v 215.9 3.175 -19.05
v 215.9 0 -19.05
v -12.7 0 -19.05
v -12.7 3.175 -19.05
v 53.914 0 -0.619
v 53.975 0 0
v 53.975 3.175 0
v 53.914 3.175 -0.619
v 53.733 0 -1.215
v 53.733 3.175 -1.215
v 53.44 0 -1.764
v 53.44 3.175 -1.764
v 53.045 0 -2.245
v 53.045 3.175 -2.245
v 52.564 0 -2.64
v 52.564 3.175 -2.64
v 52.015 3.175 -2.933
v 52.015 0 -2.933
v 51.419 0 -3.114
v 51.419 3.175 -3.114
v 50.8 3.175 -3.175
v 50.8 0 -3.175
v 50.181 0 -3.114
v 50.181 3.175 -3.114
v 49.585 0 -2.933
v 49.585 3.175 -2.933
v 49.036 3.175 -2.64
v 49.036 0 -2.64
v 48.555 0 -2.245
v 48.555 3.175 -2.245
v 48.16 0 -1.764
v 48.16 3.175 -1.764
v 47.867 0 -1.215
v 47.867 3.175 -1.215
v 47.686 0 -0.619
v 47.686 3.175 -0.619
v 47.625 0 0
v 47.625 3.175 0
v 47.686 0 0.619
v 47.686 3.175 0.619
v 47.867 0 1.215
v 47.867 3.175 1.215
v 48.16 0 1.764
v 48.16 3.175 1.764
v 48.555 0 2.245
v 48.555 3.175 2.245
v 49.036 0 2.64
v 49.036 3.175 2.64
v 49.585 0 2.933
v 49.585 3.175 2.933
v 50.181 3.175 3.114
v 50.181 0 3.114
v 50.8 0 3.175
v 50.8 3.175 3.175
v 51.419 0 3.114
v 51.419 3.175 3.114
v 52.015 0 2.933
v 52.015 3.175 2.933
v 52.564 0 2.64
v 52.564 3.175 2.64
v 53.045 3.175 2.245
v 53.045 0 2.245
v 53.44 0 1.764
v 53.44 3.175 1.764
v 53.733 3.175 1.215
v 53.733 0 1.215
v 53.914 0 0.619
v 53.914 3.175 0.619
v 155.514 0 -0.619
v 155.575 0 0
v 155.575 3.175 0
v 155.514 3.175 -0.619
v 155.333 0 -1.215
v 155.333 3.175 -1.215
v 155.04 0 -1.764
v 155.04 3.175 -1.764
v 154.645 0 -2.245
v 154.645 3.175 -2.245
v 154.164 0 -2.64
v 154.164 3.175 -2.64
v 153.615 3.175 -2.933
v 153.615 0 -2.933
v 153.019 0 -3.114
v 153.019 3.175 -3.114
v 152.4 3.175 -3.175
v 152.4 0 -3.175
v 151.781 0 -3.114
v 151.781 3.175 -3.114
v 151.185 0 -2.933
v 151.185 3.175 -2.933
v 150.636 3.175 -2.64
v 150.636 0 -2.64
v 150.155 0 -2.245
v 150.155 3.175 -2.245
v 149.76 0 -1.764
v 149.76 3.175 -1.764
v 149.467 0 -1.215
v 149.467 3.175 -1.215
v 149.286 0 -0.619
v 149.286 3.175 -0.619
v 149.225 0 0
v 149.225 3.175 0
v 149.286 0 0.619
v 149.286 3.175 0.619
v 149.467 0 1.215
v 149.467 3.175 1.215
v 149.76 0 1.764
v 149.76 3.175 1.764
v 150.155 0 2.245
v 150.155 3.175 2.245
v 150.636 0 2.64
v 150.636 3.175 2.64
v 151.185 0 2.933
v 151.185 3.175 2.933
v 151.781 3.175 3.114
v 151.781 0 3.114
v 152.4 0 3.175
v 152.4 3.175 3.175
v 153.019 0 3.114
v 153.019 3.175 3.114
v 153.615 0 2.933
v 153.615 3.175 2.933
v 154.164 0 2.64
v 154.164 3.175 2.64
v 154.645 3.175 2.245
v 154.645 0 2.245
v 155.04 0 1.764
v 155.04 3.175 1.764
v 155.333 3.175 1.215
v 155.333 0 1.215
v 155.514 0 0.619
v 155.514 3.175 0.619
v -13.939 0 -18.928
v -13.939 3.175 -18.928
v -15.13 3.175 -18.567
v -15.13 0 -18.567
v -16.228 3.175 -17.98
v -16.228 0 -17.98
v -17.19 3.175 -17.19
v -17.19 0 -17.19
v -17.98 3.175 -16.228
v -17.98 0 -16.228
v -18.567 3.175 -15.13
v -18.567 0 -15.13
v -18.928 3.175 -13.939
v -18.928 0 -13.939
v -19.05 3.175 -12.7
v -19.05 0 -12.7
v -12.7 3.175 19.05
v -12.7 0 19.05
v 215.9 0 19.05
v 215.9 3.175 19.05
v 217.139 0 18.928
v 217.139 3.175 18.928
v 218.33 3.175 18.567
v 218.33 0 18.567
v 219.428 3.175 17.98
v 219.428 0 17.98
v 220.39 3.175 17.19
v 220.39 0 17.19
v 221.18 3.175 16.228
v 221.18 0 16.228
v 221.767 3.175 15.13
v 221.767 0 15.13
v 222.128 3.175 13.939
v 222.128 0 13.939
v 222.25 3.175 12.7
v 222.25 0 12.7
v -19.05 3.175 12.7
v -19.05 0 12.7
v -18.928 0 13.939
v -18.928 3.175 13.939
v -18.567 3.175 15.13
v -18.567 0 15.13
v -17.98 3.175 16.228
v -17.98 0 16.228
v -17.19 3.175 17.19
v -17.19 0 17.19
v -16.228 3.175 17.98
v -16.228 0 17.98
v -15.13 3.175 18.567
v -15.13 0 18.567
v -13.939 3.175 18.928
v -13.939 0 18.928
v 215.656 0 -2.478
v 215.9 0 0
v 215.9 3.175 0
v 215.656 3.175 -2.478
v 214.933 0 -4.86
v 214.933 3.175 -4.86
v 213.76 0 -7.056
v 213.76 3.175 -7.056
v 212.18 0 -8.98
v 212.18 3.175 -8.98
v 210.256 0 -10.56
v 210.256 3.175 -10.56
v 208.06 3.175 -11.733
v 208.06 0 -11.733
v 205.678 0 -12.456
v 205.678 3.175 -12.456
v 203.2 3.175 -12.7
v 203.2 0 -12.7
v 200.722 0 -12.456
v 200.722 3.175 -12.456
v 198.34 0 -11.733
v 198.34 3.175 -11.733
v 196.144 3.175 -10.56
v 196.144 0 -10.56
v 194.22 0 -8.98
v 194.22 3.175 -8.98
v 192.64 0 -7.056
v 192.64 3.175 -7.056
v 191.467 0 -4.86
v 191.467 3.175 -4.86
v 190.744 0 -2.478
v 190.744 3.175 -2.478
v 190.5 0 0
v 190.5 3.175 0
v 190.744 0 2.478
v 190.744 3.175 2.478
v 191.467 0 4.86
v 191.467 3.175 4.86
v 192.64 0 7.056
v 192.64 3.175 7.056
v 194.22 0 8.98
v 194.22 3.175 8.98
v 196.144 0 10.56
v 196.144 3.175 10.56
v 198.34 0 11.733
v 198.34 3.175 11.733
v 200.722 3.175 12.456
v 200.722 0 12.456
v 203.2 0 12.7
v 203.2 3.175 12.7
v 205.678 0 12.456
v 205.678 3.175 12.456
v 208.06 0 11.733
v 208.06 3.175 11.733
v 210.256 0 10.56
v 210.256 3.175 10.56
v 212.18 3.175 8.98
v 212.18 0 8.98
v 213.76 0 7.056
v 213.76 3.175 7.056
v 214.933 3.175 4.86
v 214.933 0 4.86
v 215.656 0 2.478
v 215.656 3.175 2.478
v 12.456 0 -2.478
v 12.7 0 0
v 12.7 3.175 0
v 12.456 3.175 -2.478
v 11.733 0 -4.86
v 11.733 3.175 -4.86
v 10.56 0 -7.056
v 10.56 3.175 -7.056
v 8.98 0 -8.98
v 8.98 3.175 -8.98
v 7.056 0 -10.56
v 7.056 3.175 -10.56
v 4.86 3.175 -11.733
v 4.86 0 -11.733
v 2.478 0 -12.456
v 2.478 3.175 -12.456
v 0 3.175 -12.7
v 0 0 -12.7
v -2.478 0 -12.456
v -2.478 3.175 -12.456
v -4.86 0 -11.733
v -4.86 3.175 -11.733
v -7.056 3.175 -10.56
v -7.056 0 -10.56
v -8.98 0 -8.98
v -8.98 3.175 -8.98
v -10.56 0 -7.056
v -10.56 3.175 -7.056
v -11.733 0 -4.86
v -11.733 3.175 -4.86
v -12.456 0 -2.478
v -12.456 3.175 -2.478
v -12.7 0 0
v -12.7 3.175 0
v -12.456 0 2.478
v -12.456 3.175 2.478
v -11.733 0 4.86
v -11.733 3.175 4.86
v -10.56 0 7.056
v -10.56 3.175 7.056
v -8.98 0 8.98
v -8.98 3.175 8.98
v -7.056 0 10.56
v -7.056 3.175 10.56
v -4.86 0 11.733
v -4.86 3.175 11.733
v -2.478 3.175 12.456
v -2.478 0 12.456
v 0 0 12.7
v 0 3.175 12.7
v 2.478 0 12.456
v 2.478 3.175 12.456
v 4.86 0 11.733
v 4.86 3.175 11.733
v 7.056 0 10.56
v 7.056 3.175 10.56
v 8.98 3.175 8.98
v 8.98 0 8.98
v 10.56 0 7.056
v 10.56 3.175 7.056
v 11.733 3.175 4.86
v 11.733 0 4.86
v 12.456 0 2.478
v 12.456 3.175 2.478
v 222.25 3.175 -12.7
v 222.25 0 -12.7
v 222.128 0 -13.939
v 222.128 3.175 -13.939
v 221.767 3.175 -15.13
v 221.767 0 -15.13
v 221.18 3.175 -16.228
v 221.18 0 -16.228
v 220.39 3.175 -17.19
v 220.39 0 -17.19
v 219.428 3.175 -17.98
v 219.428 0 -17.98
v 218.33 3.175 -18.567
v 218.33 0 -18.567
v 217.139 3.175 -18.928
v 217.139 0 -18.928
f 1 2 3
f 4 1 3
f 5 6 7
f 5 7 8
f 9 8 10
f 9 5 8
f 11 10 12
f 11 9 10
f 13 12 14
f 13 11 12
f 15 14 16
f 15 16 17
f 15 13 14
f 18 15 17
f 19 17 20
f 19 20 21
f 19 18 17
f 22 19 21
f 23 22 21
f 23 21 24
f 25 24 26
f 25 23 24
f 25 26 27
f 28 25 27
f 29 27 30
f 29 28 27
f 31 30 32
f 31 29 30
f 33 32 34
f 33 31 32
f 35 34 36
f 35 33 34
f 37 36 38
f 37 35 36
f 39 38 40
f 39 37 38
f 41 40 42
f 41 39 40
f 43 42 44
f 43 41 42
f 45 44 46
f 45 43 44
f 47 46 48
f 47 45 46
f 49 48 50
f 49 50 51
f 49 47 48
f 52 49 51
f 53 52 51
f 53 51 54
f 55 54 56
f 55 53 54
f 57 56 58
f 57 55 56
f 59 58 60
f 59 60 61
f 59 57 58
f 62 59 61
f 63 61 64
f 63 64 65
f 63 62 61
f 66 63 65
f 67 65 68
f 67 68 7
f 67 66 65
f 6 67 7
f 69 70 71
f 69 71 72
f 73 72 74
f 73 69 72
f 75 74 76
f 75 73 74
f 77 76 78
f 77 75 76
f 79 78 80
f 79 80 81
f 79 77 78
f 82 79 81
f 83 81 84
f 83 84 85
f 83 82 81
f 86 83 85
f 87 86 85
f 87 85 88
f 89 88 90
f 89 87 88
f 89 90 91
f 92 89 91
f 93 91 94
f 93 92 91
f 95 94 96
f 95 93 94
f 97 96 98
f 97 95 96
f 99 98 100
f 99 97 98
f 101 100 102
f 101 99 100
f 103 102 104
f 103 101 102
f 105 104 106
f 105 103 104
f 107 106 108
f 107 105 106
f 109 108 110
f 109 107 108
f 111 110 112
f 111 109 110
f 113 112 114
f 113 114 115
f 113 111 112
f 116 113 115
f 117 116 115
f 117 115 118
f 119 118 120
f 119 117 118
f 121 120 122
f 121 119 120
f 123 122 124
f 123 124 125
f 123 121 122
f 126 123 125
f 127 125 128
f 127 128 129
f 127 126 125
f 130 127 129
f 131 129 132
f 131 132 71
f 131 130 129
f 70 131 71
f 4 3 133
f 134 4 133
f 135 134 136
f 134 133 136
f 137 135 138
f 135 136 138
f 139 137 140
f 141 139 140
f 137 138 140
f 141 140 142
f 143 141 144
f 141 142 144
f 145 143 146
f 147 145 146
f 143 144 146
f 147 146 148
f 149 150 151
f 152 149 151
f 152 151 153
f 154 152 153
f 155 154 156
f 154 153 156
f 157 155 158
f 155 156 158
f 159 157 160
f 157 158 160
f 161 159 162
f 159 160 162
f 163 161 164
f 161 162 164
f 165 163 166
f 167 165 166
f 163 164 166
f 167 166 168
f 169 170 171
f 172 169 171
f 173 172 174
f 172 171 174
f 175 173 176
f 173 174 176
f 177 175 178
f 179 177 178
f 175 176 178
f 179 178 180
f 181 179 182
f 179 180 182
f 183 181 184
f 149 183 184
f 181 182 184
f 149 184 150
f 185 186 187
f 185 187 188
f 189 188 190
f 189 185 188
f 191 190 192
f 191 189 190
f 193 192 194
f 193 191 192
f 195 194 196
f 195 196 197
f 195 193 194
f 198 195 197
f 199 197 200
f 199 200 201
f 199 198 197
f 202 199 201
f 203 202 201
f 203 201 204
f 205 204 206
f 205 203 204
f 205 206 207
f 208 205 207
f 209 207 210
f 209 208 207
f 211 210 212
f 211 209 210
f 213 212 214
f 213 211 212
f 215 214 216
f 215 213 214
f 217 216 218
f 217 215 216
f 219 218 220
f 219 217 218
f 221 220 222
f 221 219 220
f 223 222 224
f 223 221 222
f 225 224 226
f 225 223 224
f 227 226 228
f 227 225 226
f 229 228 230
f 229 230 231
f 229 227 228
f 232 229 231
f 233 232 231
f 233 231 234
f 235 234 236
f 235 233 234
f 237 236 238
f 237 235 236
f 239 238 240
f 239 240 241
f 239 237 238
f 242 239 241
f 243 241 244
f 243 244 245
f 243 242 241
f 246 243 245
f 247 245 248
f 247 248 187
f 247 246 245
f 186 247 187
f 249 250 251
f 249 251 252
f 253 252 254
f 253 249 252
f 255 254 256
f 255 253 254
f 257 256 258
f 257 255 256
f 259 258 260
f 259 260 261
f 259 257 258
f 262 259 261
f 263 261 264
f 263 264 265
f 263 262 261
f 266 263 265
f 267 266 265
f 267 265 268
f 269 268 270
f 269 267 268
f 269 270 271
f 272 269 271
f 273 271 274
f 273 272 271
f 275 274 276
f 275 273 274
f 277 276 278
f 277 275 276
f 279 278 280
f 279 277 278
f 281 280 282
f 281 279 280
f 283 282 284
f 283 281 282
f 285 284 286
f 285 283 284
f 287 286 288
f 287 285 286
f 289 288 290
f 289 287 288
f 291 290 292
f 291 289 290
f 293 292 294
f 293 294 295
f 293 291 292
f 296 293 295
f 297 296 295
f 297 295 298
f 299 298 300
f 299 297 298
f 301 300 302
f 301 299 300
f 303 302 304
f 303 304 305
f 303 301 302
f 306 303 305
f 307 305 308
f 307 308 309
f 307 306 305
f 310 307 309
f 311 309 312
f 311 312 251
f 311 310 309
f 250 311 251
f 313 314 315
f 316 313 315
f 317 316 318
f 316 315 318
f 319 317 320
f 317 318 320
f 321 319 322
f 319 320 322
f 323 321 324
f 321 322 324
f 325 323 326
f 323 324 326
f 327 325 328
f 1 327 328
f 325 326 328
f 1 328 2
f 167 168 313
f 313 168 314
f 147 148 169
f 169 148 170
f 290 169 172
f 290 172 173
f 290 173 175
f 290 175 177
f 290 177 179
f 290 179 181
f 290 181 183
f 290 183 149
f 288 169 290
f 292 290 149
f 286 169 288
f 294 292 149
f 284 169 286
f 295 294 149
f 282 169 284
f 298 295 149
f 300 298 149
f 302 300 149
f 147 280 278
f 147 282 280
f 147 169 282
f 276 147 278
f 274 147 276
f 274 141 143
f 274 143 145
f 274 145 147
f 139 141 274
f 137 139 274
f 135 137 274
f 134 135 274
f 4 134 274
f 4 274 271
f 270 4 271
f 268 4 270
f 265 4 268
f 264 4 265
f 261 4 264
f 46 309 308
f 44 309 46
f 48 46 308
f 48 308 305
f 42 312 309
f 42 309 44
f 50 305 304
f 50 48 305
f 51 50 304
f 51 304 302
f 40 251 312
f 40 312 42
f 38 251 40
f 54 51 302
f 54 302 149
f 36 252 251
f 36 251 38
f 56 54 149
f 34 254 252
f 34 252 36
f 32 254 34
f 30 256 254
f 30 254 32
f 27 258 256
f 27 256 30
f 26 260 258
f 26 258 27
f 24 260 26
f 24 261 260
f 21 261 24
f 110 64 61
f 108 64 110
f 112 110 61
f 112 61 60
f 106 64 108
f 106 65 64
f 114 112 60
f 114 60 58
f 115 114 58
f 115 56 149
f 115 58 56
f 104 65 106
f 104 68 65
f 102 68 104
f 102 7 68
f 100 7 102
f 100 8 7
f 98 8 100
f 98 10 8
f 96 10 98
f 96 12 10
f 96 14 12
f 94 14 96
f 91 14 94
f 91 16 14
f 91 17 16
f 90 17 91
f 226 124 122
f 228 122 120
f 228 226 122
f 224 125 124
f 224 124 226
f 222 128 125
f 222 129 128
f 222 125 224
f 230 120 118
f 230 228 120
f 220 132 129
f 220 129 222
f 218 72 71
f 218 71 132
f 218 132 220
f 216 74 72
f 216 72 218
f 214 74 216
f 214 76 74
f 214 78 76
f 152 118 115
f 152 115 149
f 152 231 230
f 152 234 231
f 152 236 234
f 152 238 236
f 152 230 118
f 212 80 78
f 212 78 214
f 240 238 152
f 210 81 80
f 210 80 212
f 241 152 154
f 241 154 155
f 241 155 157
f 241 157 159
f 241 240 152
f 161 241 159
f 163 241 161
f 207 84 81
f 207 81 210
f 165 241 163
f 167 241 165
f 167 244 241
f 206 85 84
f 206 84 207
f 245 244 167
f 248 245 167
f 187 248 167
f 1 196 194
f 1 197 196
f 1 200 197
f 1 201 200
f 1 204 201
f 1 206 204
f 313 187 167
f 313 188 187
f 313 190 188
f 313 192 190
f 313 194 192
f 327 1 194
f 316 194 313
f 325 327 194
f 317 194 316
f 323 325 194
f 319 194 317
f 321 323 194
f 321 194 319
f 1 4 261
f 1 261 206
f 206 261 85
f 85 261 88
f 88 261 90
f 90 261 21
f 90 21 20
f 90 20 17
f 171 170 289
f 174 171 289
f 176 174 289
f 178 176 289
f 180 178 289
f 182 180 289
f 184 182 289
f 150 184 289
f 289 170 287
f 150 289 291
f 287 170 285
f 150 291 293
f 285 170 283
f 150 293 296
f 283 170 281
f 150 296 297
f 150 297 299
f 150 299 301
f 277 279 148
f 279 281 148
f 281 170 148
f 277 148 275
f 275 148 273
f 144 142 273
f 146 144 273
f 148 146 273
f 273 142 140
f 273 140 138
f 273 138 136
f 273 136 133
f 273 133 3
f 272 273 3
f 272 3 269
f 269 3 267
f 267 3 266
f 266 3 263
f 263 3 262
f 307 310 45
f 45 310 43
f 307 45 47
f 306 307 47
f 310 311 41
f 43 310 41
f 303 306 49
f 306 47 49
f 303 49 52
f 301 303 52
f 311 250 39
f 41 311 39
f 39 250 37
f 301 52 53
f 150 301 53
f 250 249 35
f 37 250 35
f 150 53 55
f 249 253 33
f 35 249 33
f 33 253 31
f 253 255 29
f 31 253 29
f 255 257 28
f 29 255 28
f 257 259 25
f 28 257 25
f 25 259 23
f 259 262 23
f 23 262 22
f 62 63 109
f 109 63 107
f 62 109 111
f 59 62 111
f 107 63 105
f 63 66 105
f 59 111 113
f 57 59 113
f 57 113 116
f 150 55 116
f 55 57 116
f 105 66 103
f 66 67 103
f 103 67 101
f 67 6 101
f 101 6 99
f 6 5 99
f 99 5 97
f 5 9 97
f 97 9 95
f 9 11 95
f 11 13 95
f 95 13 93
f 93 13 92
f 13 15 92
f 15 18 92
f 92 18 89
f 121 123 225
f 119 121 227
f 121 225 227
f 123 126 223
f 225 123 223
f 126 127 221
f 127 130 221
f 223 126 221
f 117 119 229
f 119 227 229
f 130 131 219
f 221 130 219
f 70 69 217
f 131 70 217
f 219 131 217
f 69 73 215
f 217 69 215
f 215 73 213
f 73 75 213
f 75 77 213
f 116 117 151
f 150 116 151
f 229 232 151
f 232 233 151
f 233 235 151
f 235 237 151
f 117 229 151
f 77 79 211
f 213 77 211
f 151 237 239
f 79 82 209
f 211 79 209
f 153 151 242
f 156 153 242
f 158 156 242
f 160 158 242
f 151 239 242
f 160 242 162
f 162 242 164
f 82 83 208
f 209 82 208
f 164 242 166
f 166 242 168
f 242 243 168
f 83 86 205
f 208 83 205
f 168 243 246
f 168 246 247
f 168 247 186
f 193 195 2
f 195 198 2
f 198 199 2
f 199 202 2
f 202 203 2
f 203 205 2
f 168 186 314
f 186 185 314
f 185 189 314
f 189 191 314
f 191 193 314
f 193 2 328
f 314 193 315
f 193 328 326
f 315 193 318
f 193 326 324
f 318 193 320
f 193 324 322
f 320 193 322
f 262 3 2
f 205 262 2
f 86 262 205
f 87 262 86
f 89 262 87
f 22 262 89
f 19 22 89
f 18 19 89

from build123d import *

# Parameters (mm, degrees)
SKETCH1_R           = 12.7
SKETCH1_R_2         = 3.175
BOSS_EXTRUDE1_DEPTH = 3.175


with BuildPart() as part:
    # Sketch1 → Boss-Extrude1 (new body)
    with BuildSketch(Plane(origin=(0, 0, 0), x_dir=(1, 0, 0), z_dir=(0, 1, 0))):
        with BuildLine():
            Line((-12.7, -19.05), (215.9, -19.05))
            ThreePointArc((215.9, -19.05), (220.390128061, -17.190128061), (222.25, -12.7))
            Line((222.25, -12.7), (222.25, 12.7))
            ThreePointArc((222.25, 12.7), (220.390128061, 17.190128061), (215.9, 19.05))
            Line((215.9, 19.05), (-12.7, 19.05))
            ThreePointArc((-12.7, 19.05), (-17.190128061, 17.190128061), (-19.05, 12.7))
            Line((-19.05, 12.7), (-19.05, -12.7))
            ThreePointArc((-19.05, -12.7), (-17.190128061, -17.190128061), (-12.7, -19.05))
        make_face()
        Circle(SKETCH1_R, mode=Mode.SUBTRACT)
        with Locations((203.2, 0)):
            Circle(SKETCH1_R, mode=Mode.SUBTRACT)
        with Locations((50.8, 0)):
            Circle(SKETCH1_R_2, mode=Mode.SUBTRACT)
        with Locations((152.4, 0)):
            Circle(SKETCH1_R_2, mode=Mode.SUBTRACT)
    extrude(amount=BOSS_EXTRUDE1_DEPTH)


solid = part.part
